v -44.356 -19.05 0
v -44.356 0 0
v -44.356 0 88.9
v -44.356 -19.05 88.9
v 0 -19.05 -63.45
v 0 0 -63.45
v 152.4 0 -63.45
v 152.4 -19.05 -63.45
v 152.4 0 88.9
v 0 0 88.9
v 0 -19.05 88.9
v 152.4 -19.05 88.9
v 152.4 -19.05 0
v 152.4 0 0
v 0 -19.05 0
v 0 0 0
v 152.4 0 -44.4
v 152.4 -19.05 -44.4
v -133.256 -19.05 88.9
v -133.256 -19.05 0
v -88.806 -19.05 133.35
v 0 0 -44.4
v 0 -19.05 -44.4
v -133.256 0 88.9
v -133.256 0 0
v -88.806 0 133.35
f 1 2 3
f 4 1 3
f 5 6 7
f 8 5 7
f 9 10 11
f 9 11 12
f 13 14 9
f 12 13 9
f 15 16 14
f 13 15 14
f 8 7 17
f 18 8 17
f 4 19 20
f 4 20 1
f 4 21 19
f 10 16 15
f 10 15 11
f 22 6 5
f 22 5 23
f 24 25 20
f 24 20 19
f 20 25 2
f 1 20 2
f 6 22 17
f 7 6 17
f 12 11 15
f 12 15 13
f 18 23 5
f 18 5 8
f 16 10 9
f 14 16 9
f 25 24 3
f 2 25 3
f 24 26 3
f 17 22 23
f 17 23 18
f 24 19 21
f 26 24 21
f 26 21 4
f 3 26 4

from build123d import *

# Parameters (mm, degrees)
F0_W     = 152.4
F0_H     = 88.9
F1_DEPTH = 19.05
F2_W     = 88.9
F2_H     = 133.35
F3_DEPTH = 19.05
F5_DEPTH = 19.051
F6_W     = 152.4
F6_H     = 19.05
F7_DEPTH = 19.05


with BuildPart() as f1:
    # F0 (on Front) → F1 (new body)
    with BuildSketch(Plane.XZ):
        with Locations((76.2, 44.45)):
            Rectangle(F0_W, F0_H)
    extrude(amount=F1_DEPTH)


with BuildPart() as f3:
    # F2 (on Front) → F3 (new body)
    with BuildSketch(Plane.XZ):
        with Locations((-88.806303, 66.675)):
            Rectangle(F2_W, F2_H)
    extrude(amount=F3_DEPTH)

    # F4 (on face) → F5 (cut, through all)
    with BuildSketch(Plane.XZ.offset(19.05)):
        Polygon((-133.256303, 88.9), (-88.806303, 133.35), (-133.256303, 133.35), align=None)
        Polygon((-44.356303, 133.35), (-88.806303, 133.35), (-44.356303, 88.9), align=None)
    extrude(amount=-F5_DEPTH, mode=Mode.SUBTRACT)


with BuildPart() as f7:
    # F6 (on Front) → F7 (new body)
    with BuildSketch(Plane.XZ):
        with Locations((76.2, -53.925259)):
            Rectangle(F6_W, F6_H)
    extrude(amount=F7_DEPTH)


solid = Compound([f1.part, f3.part, f7.part])
